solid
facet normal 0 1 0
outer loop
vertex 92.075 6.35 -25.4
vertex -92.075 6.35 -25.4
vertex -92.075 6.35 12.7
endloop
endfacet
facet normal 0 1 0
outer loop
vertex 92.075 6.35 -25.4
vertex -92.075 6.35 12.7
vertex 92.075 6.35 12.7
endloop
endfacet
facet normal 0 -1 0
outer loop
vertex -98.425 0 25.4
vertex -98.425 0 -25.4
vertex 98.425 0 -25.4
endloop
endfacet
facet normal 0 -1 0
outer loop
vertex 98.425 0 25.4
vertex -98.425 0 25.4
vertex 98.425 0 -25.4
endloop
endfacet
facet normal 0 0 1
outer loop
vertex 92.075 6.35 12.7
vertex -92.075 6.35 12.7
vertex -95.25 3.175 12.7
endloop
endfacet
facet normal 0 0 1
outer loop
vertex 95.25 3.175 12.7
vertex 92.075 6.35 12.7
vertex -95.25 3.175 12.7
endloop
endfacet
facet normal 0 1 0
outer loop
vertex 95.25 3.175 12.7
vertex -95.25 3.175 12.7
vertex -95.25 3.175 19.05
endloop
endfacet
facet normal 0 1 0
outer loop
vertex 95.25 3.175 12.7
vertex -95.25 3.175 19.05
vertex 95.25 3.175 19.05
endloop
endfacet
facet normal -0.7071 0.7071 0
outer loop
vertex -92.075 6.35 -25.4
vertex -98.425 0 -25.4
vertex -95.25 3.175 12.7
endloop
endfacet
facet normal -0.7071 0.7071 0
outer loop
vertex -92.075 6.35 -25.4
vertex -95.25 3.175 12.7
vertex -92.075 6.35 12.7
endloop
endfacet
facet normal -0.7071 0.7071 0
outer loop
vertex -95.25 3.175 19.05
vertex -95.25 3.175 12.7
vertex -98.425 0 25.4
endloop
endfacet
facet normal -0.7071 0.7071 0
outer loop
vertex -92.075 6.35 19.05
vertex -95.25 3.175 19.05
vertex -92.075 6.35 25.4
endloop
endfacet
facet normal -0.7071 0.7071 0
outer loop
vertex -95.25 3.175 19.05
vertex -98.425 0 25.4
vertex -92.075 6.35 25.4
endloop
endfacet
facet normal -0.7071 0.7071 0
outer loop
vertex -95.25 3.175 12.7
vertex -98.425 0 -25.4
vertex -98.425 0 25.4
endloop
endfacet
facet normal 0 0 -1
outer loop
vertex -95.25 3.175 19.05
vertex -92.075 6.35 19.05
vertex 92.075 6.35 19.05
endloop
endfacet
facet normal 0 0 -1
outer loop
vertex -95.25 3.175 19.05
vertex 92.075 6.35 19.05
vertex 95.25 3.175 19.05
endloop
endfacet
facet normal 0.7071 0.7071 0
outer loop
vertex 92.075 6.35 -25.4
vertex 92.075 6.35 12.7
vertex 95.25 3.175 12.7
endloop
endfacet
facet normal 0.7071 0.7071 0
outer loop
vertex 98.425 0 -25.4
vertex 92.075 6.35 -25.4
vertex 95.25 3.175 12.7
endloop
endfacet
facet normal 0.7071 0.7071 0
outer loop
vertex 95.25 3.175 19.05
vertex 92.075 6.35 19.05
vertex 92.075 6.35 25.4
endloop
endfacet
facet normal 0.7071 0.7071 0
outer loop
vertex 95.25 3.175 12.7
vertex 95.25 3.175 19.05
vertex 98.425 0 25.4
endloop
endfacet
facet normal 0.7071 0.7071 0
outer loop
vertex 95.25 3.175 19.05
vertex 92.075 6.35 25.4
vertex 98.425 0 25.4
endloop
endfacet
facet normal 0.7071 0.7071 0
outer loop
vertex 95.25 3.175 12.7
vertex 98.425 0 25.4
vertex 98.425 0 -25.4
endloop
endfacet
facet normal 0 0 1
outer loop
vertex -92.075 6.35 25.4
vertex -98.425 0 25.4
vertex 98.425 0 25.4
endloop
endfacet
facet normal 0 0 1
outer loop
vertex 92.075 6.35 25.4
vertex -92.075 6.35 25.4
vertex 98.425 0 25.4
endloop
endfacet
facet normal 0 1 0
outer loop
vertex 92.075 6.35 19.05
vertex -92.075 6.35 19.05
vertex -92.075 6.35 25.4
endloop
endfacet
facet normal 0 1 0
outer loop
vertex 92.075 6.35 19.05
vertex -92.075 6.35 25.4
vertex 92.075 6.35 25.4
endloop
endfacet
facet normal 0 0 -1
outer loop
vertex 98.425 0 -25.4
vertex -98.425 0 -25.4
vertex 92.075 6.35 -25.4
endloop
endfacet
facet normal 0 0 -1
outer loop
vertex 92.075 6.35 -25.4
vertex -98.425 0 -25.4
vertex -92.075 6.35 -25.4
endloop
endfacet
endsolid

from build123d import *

# Parameters (mm, degrees)
SKETCH1_W               = 196.85
SKETCH1_H               = 50.8
BOSS_EXTRUDE1_DEPTH     = 6.35
SKETCH4_W               = 196.85
SKETCH4_H               = 6.35
CUT_EXTRUDE3_DEPTH      = 3.175
CUT_EXTRUDE1_DEPTH      = 1
CUT_EXTRUDE1_DEPTH_BACK = 51.8
CUT_EXTRUDE2_DEPTH      = 1
CUT_EXTRUDE2_DEPTH_BACK = 51.8


with BuildPart() as part:
    # Sketch1 → Boss-Extrude1 (new body)
    with BuildSketch(Plane(origin=(0, 0, 0), x_dir=(1, 0, 0), z_dir=(0, 1, 0))):
        Rectangle(SKETCH1_W, SKETCH1_H)
    extrude(amount=BOSS_EXTRUDE1_DEPTH)

    # Sketch4 → Cut-Extrude3 (cut)
    with BuildSketch(Plane(origin=(0, 6.35, 0), x_dir=(1, 0, 0), z_dir=(0, 1, 0))):
        with Locations((0, -15.875)):
            Rectangle(SKETCH4_W, SKETCH4_H)
    extrude(amount=-CUT_EXTRUDE3_DEPTH, mode=Mode.SUBTRACT)

    # Sketch2 → Cut-Extrude1 (cut, two sides)
    with BuildSketch(Plane.XY.offset(25.4)) as cut_extrude1_sk:
        Polygon((-384.028812745, -285.603812745), (-98.425, 0), (-92.075, 6.35), (193.528812745, 291.953812745), (-377.678812745, 863.161438235), (-955.236438235, 285.603812745), align=None)
    extrude(amount=CUT_EXTRUDE1_DEPTH, mode=Mode.SUBTRACT)
    extrude(cut_extrude1_sk.sketch, amount=-CUT_EXTRUDE1_DEPTH_BACK, mode=Mode.SUBTRACT)

    # Sketch3 → Cut-Extrude2 (cut, two sides)
    with BuildSketch(Plane.XY.offset(25.4)) as cut_extrude2_sk:
        Polygon((384.028812745, -285.603812745), (98.425, 0), (92.075, 6.35), (-193.528812745, 291.953812745), (377.678812745, 863.161438235), (955.236438235, 285.603812745), align=None)
    extrude(amount=CUT_EXTRUDE2_DEPTH, mode=Mode.SUBTRACT)
    extrude(cut_extrude2_sk.sketch, amount=-CUT_EXTRUDE2_DEPTH_BACK, mode=Mode.SUBTRACT)


solid = part.part
